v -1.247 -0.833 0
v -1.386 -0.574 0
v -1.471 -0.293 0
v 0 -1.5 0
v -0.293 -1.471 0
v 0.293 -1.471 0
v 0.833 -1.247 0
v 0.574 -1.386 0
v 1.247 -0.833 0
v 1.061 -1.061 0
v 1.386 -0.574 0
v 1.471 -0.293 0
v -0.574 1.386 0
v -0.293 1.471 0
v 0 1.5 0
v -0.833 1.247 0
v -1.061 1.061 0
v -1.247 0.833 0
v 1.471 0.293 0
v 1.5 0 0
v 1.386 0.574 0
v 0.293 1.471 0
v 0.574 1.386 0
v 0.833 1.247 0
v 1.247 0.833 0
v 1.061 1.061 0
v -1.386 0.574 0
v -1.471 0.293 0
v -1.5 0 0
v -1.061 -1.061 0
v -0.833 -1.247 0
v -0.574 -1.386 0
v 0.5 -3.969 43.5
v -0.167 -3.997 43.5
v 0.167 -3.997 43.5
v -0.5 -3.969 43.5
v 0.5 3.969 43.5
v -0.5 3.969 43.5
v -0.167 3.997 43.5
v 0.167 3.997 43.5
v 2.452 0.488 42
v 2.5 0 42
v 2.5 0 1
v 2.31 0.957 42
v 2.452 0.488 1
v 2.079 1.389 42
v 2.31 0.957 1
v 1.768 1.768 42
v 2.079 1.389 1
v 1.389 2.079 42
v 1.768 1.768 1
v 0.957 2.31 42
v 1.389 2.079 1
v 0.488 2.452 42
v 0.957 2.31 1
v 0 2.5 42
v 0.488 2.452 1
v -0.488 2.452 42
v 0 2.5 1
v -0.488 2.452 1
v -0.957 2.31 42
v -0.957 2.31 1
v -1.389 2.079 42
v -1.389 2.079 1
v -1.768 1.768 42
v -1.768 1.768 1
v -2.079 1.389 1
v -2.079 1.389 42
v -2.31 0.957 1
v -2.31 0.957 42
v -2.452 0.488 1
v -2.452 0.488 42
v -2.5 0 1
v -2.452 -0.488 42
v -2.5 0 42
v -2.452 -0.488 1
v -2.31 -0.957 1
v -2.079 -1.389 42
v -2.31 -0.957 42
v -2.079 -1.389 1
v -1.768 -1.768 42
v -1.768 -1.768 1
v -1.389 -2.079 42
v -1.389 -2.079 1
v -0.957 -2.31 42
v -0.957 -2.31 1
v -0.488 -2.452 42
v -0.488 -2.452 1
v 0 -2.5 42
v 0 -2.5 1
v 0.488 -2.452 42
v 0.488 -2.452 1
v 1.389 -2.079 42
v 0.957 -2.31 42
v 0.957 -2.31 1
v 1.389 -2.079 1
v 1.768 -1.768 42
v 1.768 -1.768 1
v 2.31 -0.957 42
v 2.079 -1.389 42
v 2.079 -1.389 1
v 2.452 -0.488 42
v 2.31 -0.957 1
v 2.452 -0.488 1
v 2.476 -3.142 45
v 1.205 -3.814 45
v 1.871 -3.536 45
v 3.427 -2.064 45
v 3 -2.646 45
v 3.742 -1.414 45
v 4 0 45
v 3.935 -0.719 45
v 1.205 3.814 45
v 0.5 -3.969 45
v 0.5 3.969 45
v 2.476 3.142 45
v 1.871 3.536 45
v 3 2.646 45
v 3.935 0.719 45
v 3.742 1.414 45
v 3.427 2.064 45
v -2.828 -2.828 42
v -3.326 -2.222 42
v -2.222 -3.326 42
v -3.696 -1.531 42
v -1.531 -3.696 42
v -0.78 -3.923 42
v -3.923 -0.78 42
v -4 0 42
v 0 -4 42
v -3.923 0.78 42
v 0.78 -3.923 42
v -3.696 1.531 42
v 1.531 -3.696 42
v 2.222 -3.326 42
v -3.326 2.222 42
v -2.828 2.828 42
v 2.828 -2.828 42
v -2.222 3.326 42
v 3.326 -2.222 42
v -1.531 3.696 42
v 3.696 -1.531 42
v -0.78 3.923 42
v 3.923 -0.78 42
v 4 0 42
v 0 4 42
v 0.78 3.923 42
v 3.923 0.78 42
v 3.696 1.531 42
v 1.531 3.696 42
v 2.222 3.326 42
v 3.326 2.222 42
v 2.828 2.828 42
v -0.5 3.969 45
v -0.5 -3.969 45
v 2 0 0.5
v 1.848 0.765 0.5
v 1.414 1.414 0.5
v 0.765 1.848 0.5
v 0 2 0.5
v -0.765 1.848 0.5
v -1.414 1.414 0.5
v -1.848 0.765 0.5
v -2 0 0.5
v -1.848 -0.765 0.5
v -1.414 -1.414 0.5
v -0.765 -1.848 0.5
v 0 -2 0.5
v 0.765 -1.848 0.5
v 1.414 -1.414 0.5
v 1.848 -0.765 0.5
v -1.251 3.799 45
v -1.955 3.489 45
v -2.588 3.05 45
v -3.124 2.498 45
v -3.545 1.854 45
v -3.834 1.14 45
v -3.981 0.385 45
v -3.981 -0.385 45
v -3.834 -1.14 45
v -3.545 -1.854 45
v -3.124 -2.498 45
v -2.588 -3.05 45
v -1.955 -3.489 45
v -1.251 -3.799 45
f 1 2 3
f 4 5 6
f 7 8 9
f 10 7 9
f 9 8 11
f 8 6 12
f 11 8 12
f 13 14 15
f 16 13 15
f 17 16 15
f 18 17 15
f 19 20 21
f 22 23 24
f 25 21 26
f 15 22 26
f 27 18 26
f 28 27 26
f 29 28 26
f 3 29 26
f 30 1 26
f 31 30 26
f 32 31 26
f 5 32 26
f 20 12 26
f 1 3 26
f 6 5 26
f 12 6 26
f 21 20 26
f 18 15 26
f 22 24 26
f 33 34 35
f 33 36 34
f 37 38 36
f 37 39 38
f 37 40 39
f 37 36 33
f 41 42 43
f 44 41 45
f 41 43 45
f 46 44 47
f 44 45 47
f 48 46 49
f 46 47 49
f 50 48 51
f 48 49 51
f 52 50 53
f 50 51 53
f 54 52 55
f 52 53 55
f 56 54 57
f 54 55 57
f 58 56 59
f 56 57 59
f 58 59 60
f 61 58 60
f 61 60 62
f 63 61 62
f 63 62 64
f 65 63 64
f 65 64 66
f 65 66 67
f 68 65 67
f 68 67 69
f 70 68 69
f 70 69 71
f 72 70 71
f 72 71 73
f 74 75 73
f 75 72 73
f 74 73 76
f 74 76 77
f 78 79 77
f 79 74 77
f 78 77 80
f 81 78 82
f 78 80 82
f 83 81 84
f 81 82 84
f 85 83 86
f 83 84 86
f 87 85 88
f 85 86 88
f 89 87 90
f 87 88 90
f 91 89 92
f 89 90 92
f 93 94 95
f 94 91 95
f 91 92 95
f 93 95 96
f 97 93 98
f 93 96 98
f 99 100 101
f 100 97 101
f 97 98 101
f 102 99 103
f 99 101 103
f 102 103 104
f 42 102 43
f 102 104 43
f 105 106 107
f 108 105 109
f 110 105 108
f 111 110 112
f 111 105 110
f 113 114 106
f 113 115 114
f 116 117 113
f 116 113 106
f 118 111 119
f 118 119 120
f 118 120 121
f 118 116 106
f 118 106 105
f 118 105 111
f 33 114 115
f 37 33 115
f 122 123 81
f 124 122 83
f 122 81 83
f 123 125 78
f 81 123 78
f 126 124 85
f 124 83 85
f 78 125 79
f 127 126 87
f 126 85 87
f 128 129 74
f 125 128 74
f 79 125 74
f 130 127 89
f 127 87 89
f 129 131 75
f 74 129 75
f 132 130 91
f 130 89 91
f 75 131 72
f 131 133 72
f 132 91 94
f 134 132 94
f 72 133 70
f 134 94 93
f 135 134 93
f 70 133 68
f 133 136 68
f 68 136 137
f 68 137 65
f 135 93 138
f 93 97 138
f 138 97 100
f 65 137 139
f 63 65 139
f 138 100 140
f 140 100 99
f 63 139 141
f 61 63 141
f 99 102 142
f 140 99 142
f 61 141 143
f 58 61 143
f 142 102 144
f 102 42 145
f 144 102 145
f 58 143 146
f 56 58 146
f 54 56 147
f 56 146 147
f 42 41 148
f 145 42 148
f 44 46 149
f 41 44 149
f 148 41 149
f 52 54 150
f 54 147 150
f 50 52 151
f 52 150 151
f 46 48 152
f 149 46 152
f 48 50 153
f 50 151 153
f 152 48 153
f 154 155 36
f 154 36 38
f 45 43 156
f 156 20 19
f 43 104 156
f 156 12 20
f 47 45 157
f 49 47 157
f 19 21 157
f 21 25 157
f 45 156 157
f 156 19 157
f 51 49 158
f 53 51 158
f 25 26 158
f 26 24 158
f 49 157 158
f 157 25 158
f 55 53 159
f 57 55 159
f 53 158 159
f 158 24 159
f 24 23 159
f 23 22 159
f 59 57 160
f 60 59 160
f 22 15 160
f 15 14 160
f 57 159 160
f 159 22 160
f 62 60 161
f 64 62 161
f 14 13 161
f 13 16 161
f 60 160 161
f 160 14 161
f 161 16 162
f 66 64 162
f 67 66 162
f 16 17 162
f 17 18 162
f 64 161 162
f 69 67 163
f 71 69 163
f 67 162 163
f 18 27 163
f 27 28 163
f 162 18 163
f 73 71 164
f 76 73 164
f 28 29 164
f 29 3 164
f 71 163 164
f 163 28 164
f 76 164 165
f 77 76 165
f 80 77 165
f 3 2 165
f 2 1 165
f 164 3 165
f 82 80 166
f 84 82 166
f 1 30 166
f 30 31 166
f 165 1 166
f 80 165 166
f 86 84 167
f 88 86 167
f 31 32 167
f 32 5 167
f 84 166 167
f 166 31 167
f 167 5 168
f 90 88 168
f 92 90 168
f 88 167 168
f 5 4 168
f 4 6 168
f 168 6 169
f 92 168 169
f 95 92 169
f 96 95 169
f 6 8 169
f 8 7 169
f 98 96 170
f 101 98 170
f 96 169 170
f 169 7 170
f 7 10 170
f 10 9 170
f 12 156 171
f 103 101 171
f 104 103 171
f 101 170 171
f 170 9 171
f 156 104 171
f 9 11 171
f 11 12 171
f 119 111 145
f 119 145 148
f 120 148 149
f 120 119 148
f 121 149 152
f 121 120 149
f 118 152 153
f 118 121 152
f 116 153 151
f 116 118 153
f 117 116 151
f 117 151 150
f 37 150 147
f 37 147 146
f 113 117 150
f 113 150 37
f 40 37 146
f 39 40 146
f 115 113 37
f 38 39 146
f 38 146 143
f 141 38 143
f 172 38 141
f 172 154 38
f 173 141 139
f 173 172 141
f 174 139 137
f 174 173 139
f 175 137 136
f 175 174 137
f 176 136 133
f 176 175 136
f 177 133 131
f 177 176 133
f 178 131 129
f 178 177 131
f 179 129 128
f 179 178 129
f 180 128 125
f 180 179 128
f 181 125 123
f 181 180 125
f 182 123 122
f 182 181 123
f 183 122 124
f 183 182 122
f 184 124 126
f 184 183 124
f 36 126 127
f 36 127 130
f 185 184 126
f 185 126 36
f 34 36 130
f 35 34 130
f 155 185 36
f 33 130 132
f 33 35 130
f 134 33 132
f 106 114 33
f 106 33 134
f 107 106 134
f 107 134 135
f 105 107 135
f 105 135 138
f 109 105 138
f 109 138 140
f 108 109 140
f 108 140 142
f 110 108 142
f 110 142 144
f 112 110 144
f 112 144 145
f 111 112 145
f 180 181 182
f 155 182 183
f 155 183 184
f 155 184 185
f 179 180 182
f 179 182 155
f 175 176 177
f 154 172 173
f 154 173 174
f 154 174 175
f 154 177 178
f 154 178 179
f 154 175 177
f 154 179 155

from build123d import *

# Parameters (mm, degrees)
SKETCH_1_R          = 2.5
EXTRUDE_1_DEPTH     = 45
SKETCH_2_R          = 4
EXTRUDE_2_DEPTH     = 3
CHAMFER_1_SIZE      = 1
SKETCH_3_W          = 1
SKETCH_3_H          = 8
CUT_EXTRUDE_1_DEPTH = 1.5


with BuildPart() as part:
    # Эскиз1 → Бобышка-Вытянуть1 (new body)
    with BuildSketch(Plane.XY):
        Circle(SKETCH_1_R)
    extrude(amount=EXTRUDE_1_DEPTH)

    # Эскиз2 → Бобышка-Вытянуть2 (add)
    with BuildSketch(Plane.XY.offset(45)):
        Circle(SKETCH_2_R)
    extrude(amount=-EXTRUDE_2_DEPTH)

    # Фаска1
    chamfer_1_edges = [part.edges().sort_by_distance(p)[0] for p in [
        (-2.5, 0, 0),
    ]]
    chamfer(chamfer_1_edges, length=CHAMFER_1_SIZE)

    # Эскиз3 → Вырез-Вытянуть1 (cut)
    with BuildSketch(Plane.XY.offset(45)):
        Rectangle(SKETCH_3_W, SKETCH_3_H)
    extrude(amount=-CUT_EXTRUDE_1_DEPTH, mode=Mode.SUBTRACT)


solid = part.part
